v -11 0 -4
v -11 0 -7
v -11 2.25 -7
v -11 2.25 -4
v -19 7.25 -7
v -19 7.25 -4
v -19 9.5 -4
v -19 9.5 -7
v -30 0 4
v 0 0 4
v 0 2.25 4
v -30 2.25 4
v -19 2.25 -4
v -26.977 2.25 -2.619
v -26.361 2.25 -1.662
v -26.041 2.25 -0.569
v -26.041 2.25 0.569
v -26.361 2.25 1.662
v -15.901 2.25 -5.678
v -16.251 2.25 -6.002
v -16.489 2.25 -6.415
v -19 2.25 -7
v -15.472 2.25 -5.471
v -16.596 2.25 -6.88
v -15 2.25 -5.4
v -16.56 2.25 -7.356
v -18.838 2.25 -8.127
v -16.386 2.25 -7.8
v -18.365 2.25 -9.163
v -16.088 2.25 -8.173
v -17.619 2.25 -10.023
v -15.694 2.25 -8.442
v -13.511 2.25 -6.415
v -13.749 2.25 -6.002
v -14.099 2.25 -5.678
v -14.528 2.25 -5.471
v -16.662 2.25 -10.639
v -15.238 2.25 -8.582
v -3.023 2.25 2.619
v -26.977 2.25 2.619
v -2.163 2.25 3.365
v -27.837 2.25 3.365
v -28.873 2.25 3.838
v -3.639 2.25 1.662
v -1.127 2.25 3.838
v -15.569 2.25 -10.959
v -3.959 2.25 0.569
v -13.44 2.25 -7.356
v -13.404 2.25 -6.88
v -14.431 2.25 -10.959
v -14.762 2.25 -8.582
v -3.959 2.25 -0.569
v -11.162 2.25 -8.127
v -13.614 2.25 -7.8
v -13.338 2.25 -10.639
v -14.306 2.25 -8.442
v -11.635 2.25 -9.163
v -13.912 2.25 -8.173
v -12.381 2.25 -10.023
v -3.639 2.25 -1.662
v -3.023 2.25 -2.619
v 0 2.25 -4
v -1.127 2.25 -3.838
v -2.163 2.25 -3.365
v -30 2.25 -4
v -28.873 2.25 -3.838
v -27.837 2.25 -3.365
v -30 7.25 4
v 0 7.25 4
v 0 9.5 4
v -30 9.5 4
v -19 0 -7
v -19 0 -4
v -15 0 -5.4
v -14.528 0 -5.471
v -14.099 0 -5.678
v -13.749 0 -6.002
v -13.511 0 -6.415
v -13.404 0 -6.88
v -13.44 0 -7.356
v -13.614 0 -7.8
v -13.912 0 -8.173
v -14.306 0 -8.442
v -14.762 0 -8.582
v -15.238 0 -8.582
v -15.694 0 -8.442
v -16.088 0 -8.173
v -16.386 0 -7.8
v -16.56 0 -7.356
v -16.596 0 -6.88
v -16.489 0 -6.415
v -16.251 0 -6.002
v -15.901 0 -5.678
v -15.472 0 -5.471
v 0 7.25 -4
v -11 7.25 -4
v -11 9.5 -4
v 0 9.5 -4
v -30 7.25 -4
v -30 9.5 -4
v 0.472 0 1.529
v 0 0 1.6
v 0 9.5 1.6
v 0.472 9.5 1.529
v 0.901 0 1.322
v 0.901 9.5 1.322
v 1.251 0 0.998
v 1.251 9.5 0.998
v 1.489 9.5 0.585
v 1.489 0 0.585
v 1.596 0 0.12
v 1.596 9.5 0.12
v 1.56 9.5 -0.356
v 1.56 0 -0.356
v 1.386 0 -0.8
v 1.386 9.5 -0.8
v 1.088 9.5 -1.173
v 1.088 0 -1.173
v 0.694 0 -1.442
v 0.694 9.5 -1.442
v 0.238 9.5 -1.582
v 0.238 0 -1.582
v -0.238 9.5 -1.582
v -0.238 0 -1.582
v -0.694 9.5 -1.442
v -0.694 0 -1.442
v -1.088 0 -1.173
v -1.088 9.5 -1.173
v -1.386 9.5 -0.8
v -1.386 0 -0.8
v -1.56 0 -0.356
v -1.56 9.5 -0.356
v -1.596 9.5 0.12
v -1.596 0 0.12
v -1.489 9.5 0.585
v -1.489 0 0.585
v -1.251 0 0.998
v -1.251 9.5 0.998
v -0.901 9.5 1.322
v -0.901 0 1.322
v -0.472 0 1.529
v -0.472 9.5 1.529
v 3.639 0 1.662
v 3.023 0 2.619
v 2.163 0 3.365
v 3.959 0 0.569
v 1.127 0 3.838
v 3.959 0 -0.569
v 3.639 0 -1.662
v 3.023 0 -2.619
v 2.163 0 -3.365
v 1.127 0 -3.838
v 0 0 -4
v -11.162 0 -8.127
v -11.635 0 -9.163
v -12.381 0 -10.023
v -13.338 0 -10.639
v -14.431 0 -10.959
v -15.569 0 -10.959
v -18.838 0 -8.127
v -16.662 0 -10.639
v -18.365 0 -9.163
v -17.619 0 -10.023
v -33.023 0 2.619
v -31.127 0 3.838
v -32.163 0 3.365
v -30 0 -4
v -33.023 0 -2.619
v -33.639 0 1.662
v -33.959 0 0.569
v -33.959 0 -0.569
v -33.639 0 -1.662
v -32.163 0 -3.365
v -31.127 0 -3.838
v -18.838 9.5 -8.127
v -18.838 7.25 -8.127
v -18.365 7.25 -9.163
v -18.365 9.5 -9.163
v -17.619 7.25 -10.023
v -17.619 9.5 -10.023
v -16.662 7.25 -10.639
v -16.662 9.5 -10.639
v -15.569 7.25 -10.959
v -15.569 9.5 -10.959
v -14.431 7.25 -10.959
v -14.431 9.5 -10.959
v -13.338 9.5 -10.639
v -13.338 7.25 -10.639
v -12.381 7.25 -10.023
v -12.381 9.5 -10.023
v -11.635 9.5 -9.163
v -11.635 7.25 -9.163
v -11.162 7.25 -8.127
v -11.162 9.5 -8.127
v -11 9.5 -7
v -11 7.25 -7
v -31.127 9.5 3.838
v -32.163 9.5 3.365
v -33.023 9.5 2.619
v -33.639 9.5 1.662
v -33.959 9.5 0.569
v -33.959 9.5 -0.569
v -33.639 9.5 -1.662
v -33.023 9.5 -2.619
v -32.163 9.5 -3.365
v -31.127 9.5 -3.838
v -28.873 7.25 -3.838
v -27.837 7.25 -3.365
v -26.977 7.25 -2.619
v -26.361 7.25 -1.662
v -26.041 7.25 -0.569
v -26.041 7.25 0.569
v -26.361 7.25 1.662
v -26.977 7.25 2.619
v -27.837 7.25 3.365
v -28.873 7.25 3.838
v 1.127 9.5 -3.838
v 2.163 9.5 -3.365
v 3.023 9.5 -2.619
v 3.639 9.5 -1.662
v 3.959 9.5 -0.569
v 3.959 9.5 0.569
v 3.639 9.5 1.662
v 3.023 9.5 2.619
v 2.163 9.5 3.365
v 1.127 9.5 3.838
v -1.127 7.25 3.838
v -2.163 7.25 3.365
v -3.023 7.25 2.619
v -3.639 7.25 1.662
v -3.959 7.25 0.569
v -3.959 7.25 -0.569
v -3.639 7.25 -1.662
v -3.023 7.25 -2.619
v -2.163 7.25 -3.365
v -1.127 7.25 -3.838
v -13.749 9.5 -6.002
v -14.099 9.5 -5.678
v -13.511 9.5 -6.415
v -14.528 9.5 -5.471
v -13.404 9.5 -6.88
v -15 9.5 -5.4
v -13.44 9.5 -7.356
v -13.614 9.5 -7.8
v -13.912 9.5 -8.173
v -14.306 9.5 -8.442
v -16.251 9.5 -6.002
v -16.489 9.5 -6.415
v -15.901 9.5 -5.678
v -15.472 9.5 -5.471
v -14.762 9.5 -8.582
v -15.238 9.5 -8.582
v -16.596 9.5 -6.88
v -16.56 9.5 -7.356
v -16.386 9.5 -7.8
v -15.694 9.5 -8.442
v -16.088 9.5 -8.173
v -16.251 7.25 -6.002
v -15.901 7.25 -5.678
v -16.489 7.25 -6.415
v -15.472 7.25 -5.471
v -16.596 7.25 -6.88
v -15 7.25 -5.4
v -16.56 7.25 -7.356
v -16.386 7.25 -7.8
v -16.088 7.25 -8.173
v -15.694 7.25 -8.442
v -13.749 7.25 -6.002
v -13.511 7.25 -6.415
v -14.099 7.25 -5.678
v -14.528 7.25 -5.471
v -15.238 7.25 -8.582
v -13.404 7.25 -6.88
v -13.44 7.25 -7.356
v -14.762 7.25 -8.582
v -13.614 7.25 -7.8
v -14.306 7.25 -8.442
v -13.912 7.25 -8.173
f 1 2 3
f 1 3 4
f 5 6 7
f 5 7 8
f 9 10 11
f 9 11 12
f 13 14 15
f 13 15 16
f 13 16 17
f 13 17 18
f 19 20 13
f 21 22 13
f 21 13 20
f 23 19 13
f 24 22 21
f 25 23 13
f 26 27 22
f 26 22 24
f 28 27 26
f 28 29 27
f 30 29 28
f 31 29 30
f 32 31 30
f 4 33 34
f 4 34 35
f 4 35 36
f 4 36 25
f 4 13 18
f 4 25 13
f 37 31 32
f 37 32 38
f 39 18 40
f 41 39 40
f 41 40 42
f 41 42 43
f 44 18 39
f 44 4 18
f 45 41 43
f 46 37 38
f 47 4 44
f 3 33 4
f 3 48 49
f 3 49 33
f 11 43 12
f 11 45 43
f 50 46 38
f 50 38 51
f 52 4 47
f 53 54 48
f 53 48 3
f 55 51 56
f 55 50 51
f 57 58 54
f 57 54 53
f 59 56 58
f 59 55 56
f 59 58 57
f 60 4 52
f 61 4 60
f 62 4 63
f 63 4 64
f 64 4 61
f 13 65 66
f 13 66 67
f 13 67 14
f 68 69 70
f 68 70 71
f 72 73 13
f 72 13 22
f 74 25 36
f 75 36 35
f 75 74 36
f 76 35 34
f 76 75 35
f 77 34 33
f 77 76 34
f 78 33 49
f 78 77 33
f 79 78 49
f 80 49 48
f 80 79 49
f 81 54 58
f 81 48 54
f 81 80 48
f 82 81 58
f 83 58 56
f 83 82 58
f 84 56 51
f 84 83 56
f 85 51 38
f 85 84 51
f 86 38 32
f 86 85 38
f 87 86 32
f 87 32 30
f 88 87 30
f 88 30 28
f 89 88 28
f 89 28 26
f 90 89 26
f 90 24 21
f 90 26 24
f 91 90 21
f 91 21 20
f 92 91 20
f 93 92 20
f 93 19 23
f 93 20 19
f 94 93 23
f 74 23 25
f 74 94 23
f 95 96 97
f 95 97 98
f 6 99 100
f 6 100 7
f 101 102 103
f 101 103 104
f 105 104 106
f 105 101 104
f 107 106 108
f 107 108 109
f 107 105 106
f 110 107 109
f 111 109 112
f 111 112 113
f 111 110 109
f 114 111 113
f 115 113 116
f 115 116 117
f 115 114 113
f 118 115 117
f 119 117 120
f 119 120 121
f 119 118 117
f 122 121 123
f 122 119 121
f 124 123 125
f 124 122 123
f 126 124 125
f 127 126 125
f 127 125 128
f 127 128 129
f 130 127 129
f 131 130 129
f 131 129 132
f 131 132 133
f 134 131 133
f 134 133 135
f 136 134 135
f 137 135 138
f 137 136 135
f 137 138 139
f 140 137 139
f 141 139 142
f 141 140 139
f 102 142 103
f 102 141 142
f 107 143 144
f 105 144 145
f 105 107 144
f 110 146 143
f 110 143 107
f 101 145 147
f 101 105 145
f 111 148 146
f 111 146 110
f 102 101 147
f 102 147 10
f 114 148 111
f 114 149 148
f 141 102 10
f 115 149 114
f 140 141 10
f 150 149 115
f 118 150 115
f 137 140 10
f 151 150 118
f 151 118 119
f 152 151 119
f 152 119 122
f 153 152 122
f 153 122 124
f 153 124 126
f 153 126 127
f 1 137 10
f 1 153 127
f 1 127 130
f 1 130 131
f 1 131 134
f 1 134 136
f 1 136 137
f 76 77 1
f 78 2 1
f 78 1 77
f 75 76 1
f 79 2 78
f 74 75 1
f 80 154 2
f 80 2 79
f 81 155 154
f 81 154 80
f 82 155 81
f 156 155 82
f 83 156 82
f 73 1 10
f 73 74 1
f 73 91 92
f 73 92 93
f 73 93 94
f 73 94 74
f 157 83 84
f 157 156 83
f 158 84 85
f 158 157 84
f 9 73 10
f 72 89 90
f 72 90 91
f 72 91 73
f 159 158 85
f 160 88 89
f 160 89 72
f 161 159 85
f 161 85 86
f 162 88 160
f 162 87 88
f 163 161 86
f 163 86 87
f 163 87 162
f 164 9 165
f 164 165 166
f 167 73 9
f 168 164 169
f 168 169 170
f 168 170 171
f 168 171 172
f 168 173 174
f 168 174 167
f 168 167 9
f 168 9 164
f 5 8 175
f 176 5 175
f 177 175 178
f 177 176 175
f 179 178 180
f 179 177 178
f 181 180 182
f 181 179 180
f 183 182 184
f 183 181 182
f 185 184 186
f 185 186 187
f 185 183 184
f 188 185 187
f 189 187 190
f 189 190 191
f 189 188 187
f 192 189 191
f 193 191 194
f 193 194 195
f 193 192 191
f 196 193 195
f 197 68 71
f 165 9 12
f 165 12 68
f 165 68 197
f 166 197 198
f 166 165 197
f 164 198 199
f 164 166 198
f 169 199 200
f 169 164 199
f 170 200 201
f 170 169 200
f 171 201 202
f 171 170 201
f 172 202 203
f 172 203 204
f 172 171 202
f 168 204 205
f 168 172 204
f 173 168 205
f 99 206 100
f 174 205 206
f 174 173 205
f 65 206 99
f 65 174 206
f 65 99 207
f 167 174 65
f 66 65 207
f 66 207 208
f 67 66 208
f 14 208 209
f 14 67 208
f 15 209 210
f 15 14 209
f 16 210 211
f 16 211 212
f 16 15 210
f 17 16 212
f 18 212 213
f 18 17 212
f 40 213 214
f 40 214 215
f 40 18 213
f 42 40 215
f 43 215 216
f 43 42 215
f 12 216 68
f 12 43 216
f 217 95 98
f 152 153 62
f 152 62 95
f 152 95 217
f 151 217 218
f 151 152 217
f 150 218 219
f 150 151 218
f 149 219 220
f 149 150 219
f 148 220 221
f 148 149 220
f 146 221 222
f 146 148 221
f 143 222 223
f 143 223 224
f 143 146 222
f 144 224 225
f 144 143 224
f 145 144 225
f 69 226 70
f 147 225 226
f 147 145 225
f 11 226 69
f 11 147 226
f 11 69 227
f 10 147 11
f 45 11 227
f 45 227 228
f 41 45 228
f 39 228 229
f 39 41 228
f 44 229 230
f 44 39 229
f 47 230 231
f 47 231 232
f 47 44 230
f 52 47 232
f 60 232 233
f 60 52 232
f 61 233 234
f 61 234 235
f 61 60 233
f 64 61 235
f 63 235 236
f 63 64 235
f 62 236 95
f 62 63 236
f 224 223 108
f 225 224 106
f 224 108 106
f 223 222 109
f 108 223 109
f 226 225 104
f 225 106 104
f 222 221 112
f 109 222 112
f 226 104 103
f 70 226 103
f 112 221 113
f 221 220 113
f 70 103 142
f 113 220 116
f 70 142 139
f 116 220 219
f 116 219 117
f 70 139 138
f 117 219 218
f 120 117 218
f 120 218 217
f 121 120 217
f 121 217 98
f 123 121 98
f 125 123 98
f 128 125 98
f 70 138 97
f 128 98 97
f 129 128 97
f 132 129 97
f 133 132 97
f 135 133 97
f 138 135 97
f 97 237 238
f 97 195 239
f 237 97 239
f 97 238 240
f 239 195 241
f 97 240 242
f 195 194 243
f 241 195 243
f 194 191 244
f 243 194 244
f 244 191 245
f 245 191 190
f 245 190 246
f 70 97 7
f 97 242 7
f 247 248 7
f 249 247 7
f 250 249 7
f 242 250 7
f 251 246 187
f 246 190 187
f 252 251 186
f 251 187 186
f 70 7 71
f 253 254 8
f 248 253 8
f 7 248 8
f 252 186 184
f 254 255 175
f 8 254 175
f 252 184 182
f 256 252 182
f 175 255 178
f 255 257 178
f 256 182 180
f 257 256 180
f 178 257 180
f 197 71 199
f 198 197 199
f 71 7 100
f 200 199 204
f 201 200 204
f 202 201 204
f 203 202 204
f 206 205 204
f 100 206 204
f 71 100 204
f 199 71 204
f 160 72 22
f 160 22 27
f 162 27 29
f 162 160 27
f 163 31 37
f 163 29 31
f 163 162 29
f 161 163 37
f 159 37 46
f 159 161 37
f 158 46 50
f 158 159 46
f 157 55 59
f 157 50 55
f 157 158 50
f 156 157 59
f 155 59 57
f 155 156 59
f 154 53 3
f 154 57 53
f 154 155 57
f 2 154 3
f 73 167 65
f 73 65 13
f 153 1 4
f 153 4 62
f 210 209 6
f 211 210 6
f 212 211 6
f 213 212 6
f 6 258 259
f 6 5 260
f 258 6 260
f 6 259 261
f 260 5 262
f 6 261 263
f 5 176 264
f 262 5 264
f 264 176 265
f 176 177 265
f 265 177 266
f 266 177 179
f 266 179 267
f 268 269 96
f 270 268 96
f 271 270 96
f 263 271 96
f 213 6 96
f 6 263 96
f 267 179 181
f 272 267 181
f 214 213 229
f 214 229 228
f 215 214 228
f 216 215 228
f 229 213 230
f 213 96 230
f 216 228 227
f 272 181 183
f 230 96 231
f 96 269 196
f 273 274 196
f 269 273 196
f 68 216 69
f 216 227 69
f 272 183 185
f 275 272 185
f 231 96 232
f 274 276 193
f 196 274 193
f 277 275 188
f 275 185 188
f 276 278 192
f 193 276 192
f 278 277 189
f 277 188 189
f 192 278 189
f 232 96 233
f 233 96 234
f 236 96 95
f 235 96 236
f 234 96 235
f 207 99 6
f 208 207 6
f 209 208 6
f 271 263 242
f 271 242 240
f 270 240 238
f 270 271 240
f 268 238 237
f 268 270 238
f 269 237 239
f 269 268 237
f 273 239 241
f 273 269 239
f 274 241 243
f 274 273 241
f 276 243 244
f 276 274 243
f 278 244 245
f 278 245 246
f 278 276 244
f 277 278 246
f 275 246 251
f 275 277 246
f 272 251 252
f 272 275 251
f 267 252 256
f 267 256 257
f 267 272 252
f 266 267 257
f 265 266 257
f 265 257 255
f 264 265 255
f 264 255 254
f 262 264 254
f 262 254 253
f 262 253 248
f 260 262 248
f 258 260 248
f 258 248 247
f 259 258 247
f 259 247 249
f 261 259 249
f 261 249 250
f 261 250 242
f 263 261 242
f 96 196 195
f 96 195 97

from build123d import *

# Parameters (mm, degrees)
SKETCH1_R               = 1.6
BOSS_EXTRUDE1_DEPTH     = 9.5
CUT_EXTRUDE1_DEPTH      = 2.5
CUT_EXTRUDE1_DEPTH_BACK = 2.5


with BuildPart() as part:
    # Sketch1 → Boss-Extrude1 (new body)
    with BuildSketch(Plane(origin=(0, 0, 0), x_dir=(1, 0, 0), z_dir=(0, 1, 0))):
        with BuildLine():
            Line((0, -4), (-30, -4))
            ThreePointArc((-30, -4), (-34, 0), (-30, 4))
            Line((-30, 4), (-19, 4))
            Line((-19, 4), (-19, 7))
            ThreePointArc((-19, 7), (-15, 11), (-11, 7))
            Line((-11, 7), (-11, 4))
            Line((-11, 4), (0, 4))
            ThreePointArc((0, 4), (4, 0), (0, -4))
        make_face()
        with Locations(Location((0, 0, 0), (0, 0, 270))):
            Circle(SKETCH1_R, mode=Mode.SUBTRACT)
        with Locations(Location((-15, 7, 0), (0, 0, 270))):
            Circle(SKETCH1_R, mode=Mode.SUBTRACT)
    extrude(amount=BOSS_EXTRUDE1_DEPTH)

    # Sketch2 → Cut-Extrude1 (cut, two sides: drawn at the far end of the back side and taken through both)
    with BuildSketch(Plane(origin=(0, 4.75, 0), x_dir=(1, 0, 0), z_dir=(0, 1, 0)).offset(-CUT_EXTRUDE1_DEPTH_BACK)):
        with BuildLine():
            Line((0, 4), (-11, 4))
            Line((-11, 4), (-11, 7))
            ThreePointArc((-11, 7), (-15, 11), (-19, 7))
            Line((-19, 7), (-19, 4))
            Line((-19, 4), (-30, 4))
            ThreePointArc((-30, 4), (-26, 0), (-30, -4))
            Line((-30, -4), (0, -4))
            ThreePointArc((0, -4), (-4, 0), (0, 4))
        make_face()
    extrude(amount=CUT_EXTRUDE1_DEPTH + CUT_EXTRUDE1_DEPTH_BACK, mode=Mode.SUBTRACT)


solid = part.part
